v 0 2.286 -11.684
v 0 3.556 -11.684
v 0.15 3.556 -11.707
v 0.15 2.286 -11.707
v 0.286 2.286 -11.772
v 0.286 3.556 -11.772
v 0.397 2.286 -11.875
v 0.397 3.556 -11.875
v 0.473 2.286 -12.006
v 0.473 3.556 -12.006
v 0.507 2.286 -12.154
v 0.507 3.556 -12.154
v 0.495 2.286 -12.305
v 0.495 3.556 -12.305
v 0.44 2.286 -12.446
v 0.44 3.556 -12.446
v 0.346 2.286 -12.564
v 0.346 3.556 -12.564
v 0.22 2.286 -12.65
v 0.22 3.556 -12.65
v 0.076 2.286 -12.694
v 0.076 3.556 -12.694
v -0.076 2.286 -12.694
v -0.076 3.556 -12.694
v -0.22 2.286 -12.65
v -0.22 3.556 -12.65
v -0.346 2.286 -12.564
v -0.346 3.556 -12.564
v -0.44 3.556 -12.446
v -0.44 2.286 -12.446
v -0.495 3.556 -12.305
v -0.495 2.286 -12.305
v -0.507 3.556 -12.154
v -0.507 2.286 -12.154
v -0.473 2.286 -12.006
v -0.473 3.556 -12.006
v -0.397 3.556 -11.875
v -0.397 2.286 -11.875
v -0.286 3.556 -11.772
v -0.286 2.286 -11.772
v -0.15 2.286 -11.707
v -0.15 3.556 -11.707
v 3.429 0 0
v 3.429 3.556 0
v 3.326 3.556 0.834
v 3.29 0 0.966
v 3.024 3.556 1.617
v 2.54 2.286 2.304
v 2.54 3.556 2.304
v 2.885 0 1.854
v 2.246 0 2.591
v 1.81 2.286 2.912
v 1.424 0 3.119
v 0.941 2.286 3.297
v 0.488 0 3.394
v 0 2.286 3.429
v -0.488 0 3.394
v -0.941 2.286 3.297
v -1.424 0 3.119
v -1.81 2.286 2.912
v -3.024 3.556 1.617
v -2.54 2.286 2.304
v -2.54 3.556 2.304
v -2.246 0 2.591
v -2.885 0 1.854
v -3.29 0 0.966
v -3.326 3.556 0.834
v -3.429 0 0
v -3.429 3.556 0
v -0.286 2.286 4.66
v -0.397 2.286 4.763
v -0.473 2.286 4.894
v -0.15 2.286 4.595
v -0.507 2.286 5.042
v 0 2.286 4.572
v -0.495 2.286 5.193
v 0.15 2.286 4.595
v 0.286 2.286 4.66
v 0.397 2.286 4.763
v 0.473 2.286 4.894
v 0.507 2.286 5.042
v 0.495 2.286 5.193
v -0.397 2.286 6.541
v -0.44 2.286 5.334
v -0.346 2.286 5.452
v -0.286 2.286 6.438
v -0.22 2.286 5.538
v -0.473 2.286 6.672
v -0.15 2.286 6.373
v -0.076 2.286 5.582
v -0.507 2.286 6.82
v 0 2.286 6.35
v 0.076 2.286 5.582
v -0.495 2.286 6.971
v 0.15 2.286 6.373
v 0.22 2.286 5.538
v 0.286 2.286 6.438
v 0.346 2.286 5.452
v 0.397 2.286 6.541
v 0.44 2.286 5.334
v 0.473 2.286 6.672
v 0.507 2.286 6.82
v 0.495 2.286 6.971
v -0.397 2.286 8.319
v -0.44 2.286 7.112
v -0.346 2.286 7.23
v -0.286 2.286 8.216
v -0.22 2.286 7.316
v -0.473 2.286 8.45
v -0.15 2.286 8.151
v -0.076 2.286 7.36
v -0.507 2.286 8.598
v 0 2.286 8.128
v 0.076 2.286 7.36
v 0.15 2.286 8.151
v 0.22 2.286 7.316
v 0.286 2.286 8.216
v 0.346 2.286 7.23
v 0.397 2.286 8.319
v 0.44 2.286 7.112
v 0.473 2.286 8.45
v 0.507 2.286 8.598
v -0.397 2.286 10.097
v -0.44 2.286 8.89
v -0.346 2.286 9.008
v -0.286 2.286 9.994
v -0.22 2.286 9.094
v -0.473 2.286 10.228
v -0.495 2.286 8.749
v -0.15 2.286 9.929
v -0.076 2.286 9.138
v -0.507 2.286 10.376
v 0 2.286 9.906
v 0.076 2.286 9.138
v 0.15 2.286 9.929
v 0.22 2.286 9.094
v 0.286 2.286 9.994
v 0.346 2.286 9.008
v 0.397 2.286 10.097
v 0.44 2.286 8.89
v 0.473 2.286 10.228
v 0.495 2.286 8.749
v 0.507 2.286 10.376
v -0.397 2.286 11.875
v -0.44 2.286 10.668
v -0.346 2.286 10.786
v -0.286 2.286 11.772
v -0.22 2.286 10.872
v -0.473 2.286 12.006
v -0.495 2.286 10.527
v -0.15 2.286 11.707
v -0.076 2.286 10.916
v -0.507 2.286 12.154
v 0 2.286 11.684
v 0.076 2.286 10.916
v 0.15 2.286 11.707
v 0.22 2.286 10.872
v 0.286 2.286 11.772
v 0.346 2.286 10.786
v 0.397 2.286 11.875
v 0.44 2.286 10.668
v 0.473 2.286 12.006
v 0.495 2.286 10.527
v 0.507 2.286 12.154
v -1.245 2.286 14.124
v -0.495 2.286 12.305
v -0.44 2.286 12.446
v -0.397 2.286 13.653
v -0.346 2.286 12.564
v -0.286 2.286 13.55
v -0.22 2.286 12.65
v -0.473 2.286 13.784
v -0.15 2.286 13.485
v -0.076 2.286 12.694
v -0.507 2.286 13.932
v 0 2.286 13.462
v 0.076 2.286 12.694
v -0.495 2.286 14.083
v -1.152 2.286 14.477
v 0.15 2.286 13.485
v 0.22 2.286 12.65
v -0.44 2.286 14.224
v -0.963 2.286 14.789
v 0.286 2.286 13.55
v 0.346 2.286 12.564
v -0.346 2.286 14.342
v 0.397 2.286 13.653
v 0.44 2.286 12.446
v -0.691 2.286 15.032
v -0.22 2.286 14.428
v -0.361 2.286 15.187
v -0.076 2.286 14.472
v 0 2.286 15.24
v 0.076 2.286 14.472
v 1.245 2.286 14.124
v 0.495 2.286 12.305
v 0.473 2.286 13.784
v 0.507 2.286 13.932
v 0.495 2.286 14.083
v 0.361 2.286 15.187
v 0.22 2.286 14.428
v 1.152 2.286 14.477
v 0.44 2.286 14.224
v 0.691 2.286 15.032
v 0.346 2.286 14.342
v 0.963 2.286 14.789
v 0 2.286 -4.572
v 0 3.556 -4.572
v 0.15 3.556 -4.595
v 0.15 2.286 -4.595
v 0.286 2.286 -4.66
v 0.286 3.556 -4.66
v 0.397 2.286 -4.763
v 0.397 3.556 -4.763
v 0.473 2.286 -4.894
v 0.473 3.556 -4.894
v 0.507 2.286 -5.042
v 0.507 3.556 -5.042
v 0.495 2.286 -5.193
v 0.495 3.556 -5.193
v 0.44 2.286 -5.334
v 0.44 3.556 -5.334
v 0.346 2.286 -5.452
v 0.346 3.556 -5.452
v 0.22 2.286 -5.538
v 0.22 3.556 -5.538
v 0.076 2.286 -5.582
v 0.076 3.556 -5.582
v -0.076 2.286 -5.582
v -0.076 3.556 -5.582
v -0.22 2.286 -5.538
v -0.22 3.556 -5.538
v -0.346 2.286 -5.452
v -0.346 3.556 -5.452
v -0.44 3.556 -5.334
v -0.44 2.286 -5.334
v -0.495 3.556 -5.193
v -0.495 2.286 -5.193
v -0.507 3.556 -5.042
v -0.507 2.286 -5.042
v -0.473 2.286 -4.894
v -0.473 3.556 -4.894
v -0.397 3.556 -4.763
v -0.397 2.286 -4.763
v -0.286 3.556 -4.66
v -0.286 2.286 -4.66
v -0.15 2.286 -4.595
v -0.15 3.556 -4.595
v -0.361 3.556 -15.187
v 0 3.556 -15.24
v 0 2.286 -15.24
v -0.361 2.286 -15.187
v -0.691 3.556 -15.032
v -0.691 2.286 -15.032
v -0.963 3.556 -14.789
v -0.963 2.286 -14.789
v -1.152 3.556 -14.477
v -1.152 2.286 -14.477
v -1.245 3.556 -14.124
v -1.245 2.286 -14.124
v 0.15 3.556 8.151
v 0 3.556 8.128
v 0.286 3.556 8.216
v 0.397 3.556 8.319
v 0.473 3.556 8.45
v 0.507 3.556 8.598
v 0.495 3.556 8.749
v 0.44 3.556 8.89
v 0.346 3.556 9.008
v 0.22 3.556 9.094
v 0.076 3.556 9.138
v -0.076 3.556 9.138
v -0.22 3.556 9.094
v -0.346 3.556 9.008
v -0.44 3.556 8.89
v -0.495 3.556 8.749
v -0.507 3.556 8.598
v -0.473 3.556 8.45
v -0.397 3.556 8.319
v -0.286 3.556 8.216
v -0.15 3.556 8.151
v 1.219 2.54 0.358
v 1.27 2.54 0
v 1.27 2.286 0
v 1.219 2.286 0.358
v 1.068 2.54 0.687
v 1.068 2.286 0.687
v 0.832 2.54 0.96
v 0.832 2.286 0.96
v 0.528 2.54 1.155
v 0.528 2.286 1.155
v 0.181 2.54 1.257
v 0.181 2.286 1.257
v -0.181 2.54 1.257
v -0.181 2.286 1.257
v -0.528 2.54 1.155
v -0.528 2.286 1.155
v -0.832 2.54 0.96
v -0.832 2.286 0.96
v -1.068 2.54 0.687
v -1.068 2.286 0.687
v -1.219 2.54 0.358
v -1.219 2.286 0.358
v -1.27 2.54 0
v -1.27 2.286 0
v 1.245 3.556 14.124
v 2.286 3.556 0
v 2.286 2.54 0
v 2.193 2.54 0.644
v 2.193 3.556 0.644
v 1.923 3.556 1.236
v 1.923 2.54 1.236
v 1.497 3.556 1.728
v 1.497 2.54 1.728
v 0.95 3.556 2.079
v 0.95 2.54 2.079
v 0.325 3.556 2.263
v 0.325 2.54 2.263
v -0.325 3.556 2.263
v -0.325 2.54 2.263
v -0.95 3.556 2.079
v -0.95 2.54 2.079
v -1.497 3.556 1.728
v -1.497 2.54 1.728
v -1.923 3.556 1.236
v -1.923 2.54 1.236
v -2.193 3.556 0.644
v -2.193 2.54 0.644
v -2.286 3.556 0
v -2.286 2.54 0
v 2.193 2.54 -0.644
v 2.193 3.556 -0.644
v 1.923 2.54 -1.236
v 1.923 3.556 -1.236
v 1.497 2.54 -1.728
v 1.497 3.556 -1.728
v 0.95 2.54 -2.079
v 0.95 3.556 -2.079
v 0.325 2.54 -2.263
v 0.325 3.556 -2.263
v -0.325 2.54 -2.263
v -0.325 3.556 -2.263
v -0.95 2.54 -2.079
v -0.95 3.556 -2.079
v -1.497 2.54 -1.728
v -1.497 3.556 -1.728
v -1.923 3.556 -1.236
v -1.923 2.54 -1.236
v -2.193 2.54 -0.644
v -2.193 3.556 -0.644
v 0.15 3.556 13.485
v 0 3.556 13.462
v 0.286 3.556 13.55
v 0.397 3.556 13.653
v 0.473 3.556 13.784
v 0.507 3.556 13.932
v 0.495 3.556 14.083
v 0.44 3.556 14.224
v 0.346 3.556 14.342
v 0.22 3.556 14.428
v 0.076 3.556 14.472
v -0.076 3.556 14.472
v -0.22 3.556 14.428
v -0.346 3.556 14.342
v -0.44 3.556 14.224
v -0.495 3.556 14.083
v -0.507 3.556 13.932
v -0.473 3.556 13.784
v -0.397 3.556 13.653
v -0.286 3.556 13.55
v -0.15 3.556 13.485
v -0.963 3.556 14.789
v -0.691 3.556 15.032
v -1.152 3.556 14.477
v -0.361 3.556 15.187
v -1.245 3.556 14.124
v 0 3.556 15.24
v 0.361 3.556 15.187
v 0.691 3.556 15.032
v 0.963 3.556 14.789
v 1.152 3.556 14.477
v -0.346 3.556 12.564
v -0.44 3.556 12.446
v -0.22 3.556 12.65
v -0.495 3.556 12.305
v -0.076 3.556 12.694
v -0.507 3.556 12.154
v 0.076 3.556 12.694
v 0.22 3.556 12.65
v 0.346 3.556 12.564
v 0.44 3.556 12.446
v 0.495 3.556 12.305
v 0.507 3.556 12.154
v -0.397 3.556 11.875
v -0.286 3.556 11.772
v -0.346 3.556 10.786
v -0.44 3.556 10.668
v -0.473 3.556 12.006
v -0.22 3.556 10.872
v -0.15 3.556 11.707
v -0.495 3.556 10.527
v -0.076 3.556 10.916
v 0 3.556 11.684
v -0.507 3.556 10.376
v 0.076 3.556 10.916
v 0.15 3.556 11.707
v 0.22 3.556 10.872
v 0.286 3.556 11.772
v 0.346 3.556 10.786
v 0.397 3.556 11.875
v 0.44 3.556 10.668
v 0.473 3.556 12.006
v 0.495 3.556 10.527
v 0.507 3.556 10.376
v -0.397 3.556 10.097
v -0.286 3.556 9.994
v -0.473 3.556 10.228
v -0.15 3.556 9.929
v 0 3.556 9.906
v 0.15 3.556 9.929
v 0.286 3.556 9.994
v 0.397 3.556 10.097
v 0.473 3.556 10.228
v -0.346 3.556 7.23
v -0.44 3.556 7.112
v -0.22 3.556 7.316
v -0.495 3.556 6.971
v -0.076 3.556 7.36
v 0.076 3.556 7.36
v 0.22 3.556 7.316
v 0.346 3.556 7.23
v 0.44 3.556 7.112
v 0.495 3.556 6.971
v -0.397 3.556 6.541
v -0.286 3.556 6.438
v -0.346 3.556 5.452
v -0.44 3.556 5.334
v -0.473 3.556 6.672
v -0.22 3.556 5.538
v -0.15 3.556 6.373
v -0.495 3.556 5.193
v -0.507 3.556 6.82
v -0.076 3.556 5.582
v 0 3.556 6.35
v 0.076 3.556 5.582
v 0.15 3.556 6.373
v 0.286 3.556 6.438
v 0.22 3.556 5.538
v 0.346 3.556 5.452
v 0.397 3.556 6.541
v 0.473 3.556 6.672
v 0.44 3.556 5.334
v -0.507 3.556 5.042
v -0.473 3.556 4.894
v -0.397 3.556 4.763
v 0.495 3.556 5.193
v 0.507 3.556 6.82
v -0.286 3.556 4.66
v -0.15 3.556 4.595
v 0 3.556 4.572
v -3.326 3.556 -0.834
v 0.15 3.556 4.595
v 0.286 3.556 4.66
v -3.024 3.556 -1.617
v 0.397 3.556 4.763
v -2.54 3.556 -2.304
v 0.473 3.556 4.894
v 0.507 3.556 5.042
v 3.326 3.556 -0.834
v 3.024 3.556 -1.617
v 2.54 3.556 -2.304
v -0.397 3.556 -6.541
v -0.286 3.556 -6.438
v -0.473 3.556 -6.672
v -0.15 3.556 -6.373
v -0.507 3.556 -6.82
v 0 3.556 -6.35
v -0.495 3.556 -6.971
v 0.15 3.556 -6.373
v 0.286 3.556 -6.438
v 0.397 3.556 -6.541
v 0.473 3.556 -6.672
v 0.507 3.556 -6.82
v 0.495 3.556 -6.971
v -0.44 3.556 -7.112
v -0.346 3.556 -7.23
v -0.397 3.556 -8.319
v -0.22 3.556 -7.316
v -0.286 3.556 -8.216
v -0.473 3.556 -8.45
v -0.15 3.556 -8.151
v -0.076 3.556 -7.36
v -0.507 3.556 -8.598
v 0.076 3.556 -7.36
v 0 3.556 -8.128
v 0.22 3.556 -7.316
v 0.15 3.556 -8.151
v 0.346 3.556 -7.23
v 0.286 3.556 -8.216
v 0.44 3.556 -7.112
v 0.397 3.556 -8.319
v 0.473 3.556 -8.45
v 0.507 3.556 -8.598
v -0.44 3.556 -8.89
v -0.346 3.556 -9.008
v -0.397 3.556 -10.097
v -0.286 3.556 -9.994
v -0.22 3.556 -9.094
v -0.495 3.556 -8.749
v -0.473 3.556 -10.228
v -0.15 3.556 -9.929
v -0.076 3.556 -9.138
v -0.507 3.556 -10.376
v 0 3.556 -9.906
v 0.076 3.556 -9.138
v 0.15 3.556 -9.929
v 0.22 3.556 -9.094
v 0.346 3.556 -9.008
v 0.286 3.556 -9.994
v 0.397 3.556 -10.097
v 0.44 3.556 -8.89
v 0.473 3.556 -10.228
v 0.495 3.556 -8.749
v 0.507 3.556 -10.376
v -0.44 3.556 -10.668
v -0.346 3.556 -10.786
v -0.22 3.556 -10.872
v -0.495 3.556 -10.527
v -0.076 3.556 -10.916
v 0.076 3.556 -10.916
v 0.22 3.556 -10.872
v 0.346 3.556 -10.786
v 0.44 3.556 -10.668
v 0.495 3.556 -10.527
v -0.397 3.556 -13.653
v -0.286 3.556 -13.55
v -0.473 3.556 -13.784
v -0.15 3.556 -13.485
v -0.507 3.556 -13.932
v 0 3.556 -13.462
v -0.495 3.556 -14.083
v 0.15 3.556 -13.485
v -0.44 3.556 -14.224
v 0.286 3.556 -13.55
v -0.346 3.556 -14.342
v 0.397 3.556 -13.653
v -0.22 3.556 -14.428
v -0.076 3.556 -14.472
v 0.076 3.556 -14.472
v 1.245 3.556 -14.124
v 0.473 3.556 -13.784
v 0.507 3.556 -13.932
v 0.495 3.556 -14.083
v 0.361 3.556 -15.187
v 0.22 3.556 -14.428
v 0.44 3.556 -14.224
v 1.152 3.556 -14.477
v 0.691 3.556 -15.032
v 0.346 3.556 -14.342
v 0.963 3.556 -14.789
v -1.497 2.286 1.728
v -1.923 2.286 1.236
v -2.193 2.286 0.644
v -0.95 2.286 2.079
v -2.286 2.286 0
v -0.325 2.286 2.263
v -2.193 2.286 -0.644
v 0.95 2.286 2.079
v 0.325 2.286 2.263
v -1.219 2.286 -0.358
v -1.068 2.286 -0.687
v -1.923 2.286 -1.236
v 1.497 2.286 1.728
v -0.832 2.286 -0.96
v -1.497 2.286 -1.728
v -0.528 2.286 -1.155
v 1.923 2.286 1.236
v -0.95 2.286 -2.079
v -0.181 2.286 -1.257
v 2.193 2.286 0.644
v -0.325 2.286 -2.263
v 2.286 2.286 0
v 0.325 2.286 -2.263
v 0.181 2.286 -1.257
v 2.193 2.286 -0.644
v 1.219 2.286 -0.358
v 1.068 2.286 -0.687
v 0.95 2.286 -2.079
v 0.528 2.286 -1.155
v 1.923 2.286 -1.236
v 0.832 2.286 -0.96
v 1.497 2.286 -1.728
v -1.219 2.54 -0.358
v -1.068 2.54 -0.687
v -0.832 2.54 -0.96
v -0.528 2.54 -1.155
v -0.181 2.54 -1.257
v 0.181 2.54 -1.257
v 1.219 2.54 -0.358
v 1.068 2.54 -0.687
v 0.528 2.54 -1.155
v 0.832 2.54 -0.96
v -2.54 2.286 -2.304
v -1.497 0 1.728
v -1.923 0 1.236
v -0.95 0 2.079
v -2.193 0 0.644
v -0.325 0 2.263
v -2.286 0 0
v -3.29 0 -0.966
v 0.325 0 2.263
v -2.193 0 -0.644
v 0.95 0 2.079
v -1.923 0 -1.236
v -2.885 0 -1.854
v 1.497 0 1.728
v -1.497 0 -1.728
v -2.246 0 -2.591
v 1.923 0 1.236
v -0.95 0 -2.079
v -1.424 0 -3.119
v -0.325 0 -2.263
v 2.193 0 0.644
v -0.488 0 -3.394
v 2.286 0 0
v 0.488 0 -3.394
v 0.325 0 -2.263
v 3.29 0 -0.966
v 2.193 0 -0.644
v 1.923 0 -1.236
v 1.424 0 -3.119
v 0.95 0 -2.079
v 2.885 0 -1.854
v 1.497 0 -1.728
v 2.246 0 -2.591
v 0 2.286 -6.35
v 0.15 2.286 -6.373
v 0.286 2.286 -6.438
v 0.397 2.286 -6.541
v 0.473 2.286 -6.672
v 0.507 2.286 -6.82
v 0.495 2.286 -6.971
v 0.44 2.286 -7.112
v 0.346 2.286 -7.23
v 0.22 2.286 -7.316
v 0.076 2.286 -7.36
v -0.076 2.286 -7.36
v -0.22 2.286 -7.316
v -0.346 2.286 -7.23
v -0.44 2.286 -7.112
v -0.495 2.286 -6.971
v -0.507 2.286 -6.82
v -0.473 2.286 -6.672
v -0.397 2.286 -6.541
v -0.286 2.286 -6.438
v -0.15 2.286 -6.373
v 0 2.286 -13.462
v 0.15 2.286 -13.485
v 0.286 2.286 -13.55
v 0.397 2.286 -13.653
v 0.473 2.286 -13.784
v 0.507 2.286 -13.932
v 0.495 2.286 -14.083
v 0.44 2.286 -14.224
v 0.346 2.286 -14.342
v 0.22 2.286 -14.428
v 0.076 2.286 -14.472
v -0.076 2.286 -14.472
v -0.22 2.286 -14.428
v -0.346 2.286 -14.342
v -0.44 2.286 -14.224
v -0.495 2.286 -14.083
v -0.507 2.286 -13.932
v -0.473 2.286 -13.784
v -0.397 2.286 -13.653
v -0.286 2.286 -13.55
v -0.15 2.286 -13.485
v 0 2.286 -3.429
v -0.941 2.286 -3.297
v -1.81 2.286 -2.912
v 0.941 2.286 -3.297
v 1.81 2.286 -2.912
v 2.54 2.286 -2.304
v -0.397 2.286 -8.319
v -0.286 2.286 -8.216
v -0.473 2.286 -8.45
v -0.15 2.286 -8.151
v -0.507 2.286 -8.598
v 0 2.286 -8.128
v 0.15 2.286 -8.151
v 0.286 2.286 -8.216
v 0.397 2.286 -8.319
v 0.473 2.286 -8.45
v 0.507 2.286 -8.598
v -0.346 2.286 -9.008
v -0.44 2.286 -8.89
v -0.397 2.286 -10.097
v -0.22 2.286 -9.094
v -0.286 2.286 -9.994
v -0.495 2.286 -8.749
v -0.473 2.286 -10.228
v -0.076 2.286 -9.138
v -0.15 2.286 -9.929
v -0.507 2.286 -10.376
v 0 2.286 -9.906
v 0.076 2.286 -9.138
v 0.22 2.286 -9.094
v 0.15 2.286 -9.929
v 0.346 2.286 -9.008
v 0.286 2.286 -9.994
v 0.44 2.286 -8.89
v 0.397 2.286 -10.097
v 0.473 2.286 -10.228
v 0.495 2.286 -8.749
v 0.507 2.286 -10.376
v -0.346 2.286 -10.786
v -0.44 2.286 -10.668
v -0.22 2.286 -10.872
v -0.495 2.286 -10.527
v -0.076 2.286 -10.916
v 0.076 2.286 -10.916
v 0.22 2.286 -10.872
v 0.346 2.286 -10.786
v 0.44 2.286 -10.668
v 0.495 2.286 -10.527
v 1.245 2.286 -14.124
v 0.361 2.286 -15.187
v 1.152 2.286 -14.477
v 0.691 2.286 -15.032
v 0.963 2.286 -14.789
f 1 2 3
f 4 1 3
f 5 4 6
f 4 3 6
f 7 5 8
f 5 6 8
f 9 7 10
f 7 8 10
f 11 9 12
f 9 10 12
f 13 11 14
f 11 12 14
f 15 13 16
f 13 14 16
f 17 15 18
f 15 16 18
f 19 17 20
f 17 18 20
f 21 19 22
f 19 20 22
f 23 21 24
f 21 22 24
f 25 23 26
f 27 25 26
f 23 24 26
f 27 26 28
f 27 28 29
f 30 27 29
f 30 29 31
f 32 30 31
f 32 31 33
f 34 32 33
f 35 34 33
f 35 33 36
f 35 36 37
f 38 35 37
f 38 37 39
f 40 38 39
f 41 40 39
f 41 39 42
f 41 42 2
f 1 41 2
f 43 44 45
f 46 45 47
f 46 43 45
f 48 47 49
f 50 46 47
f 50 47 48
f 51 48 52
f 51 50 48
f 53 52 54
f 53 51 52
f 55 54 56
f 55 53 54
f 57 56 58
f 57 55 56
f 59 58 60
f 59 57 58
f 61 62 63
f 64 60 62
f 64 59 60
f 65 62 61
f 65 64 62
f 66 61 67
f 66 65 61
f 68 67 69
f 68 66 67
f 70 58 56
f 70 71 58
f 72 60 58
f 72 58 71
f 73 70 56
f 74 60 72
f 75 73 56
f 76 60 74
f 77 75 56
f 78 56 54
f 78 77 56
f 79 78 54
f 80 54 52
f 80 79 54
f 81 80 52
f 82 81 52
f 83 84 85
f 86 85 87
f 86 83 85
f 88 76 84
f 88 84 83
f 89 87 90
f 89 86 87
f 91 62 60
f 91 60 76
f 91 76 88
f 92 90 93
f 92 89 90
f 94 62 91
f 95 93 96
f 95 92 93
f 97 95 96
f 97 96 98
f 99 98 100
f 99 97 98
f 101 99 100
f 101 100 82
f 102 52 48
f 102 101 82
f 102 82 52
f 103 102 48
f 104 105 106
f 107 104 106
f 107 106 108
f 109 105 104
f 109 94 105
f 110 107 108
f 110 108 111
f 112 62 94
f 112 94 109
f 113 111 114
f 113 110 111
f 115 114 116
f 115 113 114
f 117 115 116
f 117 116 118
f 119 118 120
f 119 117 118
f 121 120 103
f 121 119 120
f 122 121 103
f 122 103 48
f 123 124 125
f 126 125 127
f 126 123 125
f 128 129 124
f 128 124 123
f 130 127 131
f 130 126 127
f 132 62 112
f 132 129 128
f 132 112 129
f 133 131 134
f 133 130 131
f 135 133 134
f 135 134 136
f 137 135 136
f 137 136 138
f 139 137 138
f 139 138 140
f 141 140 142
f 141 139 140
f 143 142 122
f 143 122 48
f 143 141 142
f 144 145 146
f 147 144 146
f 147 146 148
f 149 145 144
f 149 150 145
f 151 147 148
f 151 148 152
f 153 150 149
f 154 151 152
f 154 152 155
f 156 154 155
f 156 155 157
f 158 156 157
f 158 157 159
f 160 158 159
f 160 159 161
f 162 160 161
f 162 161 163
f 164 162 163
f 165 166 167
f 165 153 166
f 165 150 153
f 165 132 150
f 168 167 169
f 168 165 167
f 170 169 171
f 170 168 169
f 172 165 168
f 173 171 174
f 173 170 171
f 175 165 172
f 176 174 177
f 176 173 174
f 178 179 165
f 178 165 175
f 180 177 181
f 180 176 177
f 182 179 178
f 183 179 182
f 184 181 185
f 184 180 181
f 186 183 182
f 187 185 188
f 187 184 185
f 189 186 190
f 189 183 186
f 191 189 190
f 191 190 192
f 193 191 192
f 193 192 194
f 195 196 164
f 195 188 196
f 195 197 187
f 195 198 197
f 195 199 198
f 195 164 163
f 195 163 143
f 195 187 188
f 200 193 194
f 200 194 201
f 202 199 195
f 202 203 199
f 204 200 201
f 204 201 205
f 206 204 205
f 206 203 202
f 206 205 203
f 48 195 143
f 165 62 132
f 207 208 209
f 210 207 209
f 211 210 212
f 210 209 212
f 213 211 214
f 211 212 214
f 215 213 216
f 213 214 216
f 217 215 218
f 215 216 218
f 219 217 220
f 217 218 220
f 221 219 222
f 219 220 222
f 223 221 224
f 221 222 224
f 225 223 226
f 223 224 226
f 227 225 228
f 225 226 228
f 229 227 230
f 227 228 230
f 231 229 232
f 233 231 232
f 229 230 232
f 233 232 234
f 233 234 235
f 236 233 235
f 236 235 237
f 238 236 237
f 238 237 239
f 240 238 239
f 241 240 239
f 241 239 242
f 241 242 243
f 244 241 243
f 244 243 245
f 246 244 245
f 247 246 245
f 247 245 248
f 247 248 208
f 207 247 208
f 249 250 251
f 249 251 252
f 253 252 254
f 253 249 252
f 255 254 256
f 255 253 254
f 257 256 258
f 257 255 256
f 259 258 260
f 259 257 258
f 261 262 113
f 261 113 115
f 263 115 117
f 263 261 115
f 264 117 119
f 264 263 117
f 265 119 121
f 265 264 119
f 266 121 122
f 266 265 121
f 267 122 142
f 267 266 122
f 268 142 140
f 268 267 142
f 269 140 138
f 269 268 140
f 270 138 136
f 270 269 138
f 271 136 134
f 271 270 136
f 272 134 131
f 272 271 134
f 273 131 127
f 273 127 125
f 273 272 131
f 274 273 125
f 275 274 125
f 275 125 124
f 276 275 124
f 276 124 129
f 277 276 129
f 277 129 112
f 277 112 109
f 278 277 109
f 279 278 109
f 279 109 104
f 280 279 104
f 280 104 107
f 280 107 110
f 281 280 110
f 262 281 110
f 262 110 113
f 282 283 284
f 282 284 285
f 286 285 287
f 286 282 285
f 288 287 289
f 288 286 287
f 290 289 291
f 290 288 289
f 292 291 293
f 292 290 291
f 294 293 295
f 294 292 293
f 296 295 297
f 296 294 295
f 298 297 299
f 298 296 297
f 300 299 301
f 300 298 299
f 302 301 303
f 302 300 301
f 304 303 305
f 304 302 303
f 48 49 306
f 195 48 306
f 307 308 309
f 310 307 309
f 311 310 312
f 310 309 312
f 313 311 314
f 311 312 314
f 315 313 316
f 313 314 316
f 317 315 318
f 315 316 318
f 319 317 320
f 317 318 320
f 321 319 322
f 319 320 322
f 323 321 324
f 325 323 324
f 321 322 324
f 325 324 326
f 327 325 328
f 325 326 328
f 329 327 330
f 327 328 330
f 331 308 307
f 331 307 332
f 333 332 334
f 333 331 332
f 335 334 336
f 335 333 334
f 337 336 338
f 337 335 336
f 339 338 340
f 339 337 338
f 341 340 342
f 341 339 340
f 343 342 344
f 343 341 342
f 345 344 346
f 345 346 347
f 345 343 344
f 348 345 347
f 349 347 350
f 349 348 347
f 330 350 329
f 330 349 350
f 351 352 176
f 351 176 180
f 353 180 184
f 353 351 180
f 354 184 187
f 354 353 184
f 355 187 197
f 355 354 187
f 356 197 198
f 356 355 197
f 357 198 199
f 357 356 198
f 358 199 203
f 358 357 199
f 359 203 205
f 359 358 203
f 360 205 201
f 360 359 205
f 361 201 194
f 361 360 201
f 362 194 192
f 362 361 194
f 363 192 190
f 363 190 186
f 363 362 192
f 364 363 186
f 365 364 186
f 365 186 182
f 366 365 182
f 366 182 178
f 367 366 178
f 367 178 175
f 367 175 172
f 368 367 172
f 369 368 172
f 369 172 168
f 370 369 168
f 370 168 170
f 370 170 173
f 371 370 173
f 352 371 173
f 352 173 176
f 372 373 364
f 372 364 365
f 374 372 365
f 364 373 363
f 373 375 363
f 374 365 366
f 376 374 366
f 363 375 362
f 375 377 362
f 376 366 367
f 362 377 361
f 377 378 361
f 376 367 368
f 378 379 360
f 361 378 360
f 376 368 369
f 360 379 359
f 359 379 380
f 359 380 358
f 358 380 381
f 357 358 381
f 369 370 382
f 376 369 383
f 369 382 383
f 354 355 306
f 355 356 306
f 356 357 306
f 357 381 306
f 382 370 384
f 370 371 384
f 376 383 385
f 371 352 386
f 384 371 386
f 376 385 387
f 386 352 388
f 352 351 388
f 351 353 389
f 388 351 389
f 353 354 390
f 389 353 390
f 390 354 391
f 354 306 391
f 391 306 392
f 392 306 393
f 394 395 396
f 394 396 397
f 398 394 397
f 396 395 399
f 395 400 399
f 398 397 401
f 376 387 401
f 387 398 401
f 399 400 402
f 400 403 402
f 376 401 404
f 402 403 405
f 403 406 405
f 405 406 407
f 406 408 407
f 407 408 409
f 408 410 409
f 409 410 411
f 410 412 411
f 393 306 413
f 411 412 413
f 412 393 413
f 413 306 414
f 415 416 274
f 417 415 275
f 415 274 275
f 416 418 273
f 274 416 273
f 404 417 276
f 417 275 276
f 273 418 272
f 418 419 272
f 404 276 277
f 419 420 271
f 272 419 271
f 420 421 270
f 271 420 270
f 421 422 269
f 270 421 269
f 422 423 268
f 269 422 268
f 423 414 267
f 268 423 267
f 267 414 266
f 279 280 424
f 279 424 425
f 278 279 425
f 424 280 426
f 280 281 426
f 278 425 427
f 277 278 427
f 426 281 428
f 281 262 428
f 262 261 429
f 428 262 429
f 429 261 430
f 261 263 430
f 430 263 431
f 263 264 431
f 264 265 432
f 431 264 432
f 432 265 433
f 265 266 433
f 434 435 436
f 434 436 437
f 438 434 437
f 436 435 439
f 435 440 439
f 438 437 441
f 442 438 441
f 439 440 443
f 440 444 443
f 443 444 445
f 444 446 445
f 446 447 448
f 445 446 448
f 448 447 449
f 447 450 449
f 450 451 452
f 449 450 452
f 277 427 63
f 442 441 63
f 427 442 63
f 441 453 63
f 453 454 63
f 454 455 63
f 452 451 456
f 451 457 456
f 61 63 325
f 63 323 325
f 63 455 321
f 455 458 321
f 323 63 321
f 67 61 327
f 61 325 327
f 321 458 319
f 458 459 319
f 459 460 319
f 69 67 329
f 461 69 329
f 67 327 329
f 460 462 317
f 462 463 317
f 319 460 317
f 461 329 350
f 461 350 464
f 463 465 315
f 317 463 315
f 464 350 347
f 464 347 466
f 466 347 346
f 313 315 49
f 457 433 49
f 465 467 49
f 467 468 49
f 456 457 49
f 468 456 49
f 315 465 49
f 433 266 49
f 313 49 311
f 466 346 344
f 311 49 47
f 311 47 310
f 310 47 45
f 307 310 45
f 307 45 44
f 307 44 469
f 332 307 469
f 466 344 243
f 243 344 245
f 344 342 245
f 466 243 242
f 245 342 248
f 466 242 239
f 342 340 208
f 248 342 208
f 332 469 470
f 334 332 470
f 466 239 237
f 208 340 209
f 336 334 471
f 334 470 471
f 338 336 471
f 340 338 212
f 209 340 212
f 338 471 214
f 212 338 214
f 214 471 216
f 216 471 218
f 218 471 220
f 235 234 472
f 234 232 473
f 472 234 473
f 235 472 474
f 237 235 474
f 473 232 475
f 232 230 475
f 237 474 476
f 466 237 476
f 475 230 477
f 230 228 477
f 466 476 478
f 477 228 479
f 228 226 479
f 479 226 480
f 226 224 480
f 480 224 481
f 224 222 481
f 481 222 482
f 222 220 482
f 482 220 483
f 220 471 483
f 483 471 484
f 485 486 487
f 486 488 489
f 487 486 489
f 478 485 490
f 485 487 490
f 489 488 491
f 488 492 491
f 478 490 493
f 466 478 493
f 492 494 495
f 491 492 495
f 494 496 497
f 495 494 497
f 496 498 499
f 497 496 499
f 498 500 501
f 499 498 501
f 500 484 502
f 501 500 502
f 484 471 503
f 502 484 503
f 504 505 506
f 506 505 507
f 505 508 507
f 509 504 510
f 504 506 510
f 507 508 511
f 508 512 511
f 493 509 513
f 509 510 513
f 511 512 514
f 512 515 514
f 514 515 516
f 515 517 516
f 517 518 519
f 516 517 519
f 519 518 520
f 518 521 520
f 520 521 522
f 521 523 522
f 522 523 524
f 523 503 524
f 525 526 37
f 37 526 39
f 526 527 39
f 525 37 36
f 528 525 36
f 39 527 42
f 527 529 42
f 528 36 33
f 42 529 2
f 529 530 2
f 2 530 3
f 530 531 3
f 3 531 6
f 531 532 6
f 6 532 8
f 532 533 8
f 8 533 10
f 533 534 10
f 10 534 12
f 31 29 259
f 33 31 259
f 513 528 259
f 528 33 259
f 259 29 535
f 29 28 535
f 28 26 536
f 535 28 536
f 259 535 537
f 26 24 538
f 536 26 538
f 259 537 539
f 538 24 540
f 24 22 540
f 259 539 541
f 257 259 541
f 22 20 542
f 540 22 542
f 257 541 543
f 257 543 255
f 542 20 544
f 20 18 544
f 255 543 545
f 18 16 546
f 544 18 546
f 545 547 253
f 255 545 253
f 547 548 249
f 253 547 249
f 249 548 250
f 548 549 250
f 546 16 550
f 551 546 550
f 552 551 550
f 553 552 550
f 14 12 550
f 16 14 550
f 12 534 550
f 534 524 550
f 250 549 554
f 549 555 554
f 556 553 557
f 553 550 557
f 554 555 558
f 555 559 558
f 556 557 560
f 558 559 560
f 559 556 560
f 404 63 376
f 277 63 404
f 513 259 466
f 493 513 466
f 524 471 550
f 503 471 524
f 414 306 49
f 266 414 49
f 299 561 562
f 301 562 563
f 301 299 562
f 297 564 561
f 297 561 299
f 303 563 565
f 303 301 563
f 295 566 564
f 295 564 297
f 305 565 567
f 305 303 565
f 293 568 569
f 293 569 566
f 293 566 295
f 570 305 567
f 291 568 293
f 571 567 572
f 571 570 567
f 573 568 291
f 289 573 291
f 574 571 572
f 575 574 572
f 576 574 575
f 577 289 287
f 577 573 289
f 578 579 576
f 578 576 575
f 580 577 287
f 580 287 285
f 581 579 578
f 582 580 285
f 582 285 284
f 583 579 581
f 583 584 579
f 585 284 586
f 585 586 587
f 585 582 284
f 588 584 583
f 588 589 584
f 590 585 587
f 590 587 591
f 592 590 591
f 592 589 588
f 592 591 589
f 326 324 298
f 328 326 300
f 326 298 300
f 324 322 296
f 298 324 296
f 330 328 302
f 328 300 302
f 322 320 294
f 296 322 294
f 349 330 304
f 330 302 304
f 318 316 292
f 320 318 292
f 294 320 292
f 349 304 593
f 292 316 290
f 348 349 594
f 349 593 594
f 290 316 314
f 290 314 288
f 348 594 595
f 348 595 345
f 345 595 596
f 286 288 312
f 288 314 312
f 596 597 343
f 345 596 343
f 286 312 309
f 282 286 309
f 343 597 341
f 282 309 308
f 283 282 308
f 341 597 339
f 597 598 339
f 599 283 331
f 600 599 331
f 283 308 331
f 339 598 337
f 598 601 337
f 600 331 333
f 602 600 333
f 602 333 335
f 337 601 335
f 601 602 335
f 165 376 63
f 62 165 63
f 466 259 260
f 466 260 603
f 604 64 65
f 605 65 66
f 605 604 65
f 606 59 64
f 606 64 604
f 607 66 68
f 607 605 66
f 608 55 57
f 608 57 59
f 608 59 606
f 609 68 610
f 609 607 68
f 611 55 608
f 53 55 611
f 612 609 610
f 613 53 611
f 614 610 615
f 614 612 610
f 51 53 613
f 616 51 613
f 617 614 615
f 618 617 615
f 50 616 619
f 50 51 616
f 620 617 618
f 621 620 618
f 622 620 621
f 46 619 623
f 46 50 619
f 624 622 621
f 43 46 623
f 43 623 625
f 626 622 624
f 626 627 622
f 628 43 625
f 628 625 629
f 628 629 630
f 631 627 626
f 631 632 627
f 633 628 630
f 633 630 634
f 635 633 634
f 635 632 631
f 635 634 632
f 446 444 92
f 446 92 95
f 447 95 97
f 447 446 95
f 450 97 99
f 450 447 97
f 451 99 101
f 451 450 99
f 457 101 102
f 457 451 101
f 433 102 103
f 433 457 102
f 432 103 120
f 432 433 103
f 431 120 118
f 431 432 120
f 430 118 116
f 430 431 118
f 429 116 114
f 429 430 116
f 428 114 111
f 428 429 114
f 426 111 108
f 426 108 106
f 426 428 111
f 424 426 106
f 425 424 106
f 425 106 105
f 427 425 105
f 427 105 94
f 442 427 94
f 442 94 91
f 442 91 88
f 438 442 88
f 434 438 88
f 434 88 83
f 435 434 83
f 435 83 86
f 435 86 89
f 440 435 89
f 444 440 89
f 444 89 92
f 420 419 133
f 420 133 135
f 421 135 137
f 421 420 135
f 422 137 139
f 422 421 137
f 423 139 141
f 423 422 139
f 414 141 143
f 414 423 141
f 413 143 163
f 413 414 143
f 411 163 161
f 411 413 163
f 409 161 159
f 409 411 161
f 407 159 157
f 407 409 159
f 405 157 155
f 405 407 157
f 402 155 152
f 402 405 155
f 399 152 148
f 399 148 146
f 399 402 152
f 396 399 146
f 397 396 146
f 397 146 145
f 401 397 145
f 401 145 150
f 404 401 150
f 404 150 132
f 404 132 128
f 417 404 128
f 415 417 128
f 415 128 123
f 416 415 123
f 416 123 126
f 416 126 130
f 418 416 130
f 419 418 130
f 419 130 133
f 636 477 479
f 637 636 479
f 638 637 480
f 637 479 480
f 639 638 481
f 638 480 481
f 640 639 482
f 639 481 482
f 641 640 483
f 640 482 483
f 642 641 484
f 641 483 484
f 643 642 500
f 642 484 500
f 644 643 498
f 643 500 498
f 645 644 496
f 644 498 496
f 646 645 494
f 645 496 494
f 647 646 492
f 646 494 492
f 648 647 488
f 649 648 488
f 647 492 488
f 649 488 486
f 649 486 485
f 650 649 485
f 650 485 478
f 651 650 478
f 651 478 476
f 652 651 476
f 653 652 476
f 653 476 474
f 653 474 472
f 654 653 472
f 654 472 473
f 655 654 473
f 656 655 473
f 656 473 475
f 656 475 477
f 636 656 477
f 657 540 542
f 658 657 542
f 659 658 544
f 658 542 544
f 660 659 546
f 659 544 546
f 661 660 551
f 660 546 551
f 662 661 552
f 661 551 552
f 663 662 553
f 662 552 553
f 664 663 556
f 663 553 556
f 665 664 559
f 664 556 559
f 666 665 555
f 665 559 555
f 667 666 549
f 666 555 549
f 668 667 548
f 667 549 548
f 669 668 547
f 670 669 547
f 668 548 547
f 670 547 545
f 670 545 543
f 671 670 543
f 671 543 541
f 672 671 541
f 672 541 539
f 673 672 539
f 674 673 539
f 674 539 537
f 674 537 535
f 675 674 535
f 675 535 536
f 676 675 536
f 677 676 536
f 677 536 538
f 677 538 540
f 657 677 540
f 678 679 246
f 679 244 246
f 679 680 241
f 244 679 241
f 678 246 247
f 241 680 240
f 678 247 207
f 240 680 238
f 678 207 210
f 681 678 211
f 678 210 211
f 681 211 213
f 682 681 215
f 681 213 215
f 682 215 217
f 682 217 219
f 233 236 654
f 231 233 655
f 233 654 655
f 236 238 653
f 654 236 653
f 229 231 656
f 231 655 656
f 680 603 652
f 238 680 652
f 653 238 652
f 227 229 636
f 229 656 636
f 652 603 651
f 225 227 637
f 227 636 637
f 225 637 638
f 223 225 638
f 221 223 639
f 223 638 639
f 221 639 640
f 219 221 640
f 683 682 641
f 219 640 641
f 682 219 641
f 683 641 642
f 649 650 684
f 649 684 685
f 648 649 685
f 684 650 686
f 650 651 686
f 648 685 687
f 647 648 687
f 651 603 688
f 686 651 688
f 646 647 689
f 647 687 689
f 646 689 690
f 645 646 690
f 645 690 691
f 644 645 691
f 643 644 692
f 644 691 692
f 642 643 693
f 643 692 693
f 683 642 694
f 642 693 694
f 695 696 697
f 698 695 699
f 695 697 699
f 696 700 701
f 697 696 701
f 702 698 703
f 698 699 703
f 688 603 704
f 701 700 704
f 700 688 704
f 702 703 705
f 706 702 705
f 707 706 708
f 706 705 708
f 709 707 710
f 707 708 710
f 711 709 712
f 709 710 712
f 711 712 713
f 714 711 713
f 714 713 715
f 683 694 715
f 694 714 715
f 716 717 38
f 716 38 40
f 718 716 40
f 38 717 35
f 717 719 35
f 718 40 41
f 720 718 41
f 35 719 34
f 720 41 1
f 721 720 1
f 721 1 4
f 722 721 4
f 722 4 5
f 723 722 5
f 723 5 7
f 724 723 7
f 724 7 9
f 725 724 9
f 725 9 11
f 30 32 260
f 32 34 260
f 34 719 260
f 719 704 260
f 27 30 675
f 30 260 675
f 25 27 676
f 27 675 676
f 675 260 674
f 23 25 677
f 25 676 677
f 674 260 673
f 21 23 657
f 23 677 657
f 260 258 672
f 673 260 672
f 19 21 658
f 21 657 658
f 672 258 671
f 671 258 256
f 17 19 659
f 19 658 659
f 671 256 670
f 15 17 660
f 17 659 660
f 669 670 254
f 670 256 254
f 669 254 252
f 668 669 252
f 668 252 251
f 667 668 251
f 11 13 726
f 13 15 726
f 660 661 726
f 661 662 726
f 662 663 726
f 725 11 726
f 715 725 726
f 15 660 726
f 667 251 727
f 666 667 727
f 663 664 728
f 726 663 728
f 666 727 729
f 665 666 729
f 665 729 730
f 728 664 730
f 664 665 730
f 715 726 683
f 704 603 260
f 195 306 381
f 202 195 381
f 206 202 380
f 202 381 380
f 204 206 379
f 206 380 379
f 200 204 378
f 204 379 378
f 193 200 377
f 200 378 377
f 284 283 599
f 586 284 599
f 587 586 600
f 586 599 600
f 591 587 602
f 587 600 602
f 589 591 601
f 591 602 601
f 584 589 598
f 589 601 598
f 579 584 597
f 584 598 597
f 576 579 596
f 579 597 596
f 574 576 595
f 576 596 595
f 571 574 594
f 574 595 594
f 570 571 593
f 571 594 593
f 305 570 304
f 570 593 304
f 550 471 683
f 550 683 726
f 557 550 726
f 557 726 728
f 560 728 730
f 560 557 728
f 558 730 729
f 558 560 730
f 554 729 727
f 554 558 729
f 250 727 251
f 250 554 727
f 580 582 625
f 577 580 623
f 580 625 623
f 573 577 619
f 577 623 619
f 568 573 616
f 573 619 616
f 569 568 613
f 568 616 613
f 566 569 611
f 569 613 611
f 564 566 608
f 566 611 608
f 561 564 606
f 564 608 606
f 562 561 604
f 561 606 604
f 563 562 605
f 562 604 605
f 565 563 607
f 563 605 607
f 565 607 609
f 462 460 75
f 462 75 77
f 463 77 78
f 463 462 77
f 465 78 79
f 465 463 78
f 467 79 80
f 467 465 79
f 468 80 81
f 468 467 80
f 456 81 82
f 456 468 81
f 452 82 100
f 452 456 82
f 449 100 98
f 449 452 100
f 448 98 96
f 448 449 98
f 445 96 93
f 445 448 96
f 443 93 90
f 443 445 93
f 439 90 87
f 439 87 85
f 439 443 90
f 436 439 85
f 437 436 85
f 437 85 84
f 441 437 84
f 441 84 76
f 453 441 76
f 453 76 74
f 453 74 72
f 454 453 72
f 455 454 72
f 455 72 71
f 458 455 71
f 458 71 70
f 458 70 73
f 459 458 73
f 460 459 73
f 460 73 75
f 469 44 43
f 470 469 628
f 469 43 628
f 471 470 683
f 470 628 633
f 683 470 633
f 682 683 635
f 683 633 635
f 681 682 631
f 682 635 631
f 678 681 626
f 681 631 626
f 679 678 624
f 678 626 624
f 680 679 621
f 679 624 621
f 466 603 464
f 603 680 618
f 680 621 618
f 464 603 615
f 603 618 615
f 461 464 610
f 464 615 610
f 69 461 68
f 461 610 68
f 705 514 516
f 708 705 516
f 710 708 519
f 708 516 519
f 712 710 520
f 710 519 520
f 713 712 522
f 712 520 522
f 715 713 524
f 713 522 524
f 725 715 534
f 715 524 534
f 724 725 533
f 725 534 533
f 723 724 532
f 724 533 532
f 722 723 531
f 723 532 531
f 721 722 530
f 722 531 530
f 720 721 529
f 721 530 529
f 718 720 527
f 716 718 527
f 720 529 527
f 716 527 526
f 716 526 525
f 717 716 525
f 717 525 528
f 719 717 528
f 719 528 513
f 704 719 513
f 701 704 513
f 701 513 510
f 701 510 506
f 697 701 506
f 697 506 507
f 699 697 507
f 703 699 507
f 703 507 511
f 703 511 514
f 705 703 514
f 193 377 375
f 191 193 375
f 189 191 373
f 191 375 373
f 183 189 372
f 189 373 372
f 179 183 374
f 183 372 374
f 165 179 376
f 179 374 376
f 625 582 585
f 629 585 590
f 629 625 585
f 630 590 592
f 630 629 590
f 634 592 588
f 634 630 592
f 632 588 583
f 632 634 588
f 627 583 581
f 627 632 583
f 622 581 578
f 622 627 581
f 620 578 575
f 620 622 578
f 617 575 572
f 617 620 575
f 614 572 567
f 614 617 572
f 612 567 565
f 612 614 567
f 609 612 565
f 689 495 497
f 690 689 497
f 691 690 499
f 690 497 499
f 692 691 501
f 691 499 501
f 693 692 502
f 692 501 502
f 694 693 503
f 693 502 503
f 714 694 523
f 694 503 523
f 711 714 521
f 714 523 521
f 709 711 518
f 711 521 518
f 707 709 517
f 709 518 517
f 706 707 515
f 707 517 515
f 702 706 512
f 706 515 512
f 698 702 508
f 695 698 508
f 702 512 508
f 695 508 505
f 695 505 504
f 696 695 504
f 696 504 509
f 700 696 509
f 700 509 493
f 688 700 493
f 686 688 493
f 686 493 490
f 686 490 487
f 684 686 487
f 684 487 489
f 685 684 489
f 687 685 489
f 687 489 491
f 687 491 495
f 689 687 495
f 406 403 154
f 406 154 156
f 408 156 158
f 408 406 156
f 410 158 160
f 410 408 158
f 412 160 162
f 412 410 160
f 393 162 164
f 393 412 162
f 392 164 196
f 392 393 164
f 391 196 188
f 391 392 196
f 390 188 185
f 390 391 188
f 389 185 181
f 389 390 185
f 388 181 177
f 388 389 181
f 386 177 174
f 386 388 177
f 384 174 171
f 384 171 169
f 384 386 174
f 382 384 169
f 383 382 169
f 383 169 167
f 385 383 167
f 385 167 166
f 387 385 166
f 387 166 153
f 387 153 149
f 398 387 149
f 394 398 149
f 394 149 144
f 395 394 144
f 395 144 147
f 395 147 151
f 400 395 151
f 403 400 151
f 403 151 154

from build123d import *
from build123d.topology import SkipClean

# Parameters (mm, degrees)
SKETCH1_R               = 3.429
SKETCH1_R_2             = 2.286
BOSS_EXTRUDE1_DEPTH     = 3.556
BOSS_EXTRUDE2_START     = -1.27
BOSS_EXTRUDE2_DEPTH     = 1.27
BOSS_EXTRUDE3_START     = -1.27
SKETCH2_3_R             = 2.286
SKETCH2_3_R_2           = 1.27
BOSS_EXTRUDE3_DEPTH     = 0.254
SKETCH3_R               = 0.508
CUT_EXTRUDE1_DEPTH      = 17.020635974
LPATTERN1_COUNT         = 6
LPATTERN1_PITCH         = 1.778
CUT_EXTRUDE2_DEPTH      = 17.020635974
CUT_EXTRUDE2_DEPTH_BACK = 17.020635974
SKETCH4_W               = 4.326879353
SKETCH4_H               = 6.724216597


with BuildPart() as part:
    # Sketch1 → Boss-Extrude1 (new body)
    with BuildSketch(Plane(origin=(0, 0, 0), x_dir=(1, 0, 0), z_dir=(0, 1, 0))):
        Circle(SKETCH1_R)
        Circle(SKETCH1_R_2, mode=Mode.SUBTRACT)
    extrude(amount=BOSS_EXTRUDE1_DEPTH)

    # Sketch2 → Boss-Extrude2 (add)
    with BuildSketch(Plane(origin=(0, 3.556, 0), x_dir=(1, 0, 0), z_dir=(0, 1, 0)).offset(BOSS_EXTRUDE2_START)):
        with BuildLine():
            ThreePointArc((-2.54, 2.303571358), (0, 3.429), (2.54, 2.303571358))
            Line((2.54, 2.303571358), (1.244511661, 14.124427226))
            ThreePointArc((1.244511661, 14.124427226), (0, 15.24), (-1.244511661, 14.124427226))
            Line((-1.244511661, 14.124427226), (-2.54, 2.303571358))
        make_face()
    extrude(amount=BOSS_EXTRUDE2_DEPTH)

    # Sketch2<3> → Boss-Extrude3 (add)
    with BuildSketch(Plane(origin=(0, 3.556, 0), x_dir=(1, 0, 0), z_dir=(0, 1, 0)).offset(BOSS_EXTRUDE3_START)):
        Circle(SKETCH2_3_R)
        Circle(SKETCH2_3_R_2, mode=Mode.SUBTRACT)
    extrude(amount=BOSS_EXTRUDE3_DEPTH)

    # Sketch3 → Cut-Extrude1 (cut, through all)
    with BuildSketch(Plane(origin=(0, 3.556, 0), x_dir=(1, 0, 0), z_dir=(0, 1, 0))):
        with Locations((0, 5.08)):
            Circle(SKETCH3_R)
    cut_extrude1 = extrude(amount=-CUT_EXTRUDE1_DEPTH, mode=Mode.SUBTRACT)

    # LPattern1: Cut-Extrude1 ×6
    with Locations(*[(0, 0, -i * LPATTERN1_PITCH) for i in range(1, LPATTERN1_COUNT)]):
        add(cut_extrude1, mode=Mode.SUBTRACT)

    # Sketch4 → Cut-Extrude2 (cut, two sides: drawn at the far end of the back side and taken through both)
    with BuildSketch(Plane(origin=(0, 0, 0), x_dir=(0, 0, -1), z_dir=(1, 0, 0)).offset(-CUT_EXTRUDE2_DEPTH_BACK)):
        with Locations((-2.163439677, 3.362108299)):
            Rectangle(SKETCH4_W, SKETCH4_H)
    extrude(amount=CUT_EXTRUDE2_DEPTH + CUT_EXTRUDE2_DEPTH_BACK, mode=Mode.SUBTRACT)

    # Mirror1: part across plane


with BuildPart() as part_1:
    with SkipClean():  # the faces are left unmerged after this step: merging them gives an invalid solid
        add(part.part)
        add(part.part.mirror(Plane.XY))


solid = part_1.part
